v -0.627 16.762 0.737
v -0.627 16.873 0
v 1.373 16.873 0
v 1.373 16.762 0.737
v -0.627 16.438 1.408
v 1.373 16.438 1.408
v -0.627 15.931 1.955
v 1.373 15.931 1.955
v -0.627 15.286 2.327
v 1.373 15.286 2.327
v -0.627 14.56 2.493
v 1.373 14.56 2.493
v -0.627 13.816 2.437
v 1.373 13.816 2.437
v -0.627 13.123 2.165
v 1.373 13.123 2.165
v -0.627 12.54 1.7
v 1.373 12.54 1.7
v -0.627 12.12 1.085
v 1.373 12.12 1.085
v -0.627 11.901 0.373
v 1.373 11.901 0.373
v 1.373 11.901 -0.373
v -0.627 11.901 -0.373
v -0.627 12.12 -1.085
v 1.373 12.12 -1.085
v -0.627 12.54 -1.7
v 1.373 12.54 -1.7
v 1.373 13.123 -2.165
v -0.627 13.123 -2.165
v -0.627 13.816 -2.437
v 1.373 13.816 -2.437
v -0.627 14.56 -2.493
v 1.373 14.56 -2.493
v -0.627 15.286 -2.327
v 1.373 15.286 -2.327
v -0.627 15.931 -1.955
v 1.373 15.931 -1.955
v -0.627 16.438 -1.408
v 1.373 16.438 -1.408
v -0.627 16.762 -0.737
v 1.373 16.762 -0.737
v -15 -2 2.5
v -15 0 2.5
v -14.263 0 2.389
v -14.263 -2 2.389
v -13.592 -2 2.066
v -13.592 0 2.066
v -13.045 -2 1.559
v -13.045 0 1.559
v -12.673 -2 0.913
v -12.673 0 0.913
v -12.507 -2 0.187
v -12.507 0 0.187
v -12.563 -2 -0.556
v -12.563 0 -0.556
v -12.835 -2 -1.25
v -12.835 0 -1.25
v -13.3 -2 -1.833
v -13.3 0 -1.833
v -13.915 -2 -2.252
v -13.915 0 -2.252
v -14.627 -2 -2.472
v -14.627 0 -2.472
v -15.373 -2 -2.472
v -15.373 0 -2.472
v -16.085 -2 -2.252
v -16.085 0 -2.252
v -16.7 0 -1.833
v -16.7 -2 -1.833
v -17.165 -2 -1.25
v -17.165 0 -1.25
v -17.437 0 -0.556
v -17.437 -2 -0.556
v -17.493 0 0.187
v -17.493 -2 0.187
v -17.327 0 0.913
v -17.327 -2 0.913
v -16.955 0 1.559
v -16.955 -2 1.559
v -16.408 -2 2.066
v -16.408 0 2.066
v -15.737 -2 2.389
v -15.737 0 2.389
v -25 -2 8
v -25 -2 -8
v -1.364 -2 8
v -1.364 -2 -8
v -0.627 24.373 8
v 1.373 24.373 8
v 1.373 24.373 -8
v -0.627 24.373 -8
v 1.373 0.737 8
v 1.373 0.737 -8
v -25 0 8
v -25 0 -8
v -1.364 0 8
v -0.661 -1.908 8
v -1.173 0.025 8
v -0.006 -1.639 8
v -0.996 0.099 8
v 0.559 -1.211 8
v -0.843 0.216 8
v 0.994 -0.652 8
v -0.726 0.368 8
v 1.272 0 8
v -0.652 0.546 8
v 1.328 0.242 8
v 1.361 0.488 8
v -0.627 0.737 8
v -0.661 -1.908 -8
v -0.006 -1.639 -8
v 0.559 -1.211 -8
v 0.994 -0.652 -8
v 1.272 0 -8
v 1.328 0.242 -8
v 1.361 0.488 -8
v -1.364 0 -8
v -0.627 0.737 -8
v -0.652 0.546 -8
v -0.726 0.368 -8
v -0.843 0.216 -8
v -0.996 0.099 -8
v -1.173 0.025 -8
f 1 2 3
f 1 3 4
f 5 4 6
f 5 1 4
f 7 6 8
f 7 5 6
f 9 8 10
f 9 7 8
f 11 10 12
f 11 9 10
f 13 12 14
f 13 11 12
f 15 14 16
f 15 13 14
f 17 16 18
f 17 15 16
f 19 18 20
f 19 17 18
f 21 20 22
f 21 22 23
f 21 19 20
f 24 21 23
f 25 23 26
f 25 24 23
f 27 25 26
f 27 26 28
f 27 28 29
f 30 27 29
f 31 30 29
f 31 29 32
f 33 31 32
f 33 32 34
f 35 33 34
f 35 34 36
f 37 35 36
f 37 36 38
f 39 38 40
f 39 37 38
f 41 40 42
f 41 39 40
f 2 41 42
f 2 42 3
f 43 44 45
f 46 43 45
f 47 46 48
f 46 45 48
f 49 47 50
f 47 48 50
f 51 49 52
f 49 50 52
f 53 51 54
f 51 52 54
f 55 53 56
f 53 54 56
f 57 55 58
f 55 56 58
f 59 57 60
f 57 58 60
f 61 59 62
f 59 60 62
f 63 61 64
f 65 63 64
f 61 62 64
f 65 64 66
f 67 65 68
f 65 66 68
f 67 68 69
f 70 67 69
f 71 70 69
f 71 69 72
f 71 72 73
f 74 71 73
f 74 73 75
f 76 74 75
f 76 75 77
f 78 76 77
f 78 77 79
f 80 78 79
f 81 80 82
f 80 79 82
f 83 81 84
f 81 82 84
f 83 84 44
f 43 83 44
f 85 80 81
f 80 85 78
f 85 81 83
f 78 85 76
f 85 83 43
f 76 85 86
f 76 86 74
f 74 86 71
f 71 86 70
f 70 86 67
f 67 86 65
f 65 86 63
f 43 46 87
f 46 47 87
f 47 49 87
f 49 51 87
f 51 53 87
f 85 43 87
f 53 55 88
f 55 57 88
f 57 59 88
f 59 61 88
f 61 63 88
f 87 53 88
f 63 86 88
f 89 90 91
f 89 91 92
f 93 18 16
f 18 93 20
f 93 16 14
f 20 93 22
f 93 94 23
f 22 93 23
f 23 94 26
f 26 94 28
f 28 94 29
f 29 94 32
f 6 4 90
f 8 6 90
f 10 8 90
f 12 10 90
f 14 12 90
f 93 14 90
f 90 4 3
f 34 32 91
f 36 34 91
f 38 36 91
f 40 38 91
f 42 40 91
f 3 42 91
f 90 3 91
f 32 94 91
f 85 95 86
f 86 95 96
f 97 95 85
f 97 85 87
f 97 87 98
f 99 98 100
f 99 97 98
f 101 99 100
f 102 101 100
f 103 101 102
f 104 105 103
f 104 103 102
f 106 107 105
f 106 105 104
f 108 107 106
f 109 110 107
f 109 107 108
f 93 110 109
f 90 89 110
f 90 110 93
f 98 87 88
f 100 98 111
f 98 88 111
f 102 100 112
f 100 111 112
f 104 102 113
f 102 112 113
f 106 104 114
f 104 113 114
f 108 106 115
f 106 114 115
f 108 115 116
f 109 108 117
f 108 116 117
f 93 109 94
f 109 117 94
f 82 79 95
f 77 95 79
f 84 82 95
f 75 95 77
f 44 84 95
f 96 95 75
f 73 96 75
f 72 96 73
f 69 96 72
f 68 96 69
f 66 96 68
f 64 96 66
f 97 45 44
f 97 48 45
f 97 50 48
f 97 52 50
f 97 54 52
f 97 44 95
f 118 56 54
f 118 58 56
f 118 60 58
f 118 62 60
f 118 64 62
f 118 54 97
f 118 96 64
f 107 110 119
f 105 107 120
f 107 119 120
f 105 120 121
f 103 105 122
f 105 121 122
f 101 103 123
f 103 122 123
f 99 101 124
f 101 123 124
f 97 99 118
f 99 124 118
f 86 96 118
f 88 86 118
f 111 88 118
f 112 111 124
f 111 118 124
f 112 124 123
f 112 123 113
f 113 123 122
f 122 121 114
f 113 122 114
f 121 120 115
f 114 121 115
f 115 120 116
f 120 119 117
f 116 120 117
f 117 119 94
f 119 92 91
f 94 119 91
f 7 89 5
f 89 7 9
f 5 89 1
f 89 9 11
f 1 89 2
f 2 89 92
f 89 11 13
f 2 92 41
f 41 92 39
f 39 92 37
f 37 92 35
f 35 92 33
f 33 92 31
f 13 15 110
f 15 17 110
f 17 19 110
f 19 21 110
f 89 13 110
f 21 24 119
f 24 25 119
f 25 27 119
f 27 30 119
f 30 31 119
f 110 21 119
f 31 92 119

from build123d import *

# Parameters (mm, degrees)
CROQUIS2_W                      = 50
CROQUIS2_H                      = 16
CROQUIS2_R                      = 2.5
BRIDA_BASE1_DEPTH               = 2
PLIEGUE_START                   = -8
PLIEGUE_CROQUIZADO1_DEPTH       = 16
PLIEGUE_CROQUIZADO1_2_DEPTH     = 5.4999999
PLIEGUE_START_2                 = 2.5000001
PLIEGUE_CROQUIZADO1_3_DEPTH     = 5.4999999
PLIEGUE_START_3                 = -2.5000001
PLIEGUE_CROQUIZADO1_4_DEPTH     = 5.0000002
PLIEGUE_START_4                 = -0.627322451
PLIEGUE_CROQUIZADO1_5_OUTLINE_R = 2.5
PLIEGUE_CROQUIZADO1_5_DEPTH     = 2


with BuildPart() as part:
    # Brida base1: sheet metal written as solids
    # Croquis2 → Brida base1 (new body)
    with BuildSketch(Plane(origin=(0, 0, 0), x_dir=(1, 0, 0), z_dir=(0, 1, 0))):
        Rectangle(CROQUIS2_W, CROQUIS2_H)
        with Locations(Location((15, 0, 0), (0, 0, 270))):
            Circle(CROQUIS2_R, mode=Mode.SUBTRACT)
        with Locations(Location((-15, 0, 0), (0, 0, 270))):
            Circle(CROQUIS2_R, mode=Mode.SUBTRACT)
    extrude(amount=-BRIDA_BASE1_DEPTH)

    # Pliegue croquizado1: read off the stored shape, not the designer's step
    # Pliegue croquizado1 outline → Pliegue croquizado1 (cut)
    with BuildSketch(Plane.XY.offset(PLIEGUE_START)):
        with BuildLine():
            Line((25, 0), (1.271679947, 0))
            ThreePointArc((1.271679947, 0), (0.290344758, -1.443395312), (-1.363922451, -2))
            Line((-1.363922451, -2), (25, -2))
            Line((25, -2), (25, 0))
        make_face()
    extrude(amount=PLIEGUE_CROQUIZADO1_DEPTH, mode=Mode.SUBTRACT)

    # Pliegue croquizado1 2 outline → Pliegue croquizado1 2 (add)
    with BuildSketch(Plane.XY.offset(PLIEGUE_START)):
        with BuildLine():
            Line((-0.627322451, 24.372677549), (-0.627322451, 0.7366))
            ThreePointArc((-0.627322451, 0.7366), (-0.843067596, 0.215745145), (-1.363922451, 0))
            Line((-1.363922451, 0), (1.271679947, 0))
            ThreePointArc((1.271679947, 0), (1.347310579, 0.364854094), (1.372677549, 0.7366))
            Line((1.372677549, 0.7366), (1.372677549, 24.372677549))
            Line((1.372677549, 24.372677549), (-0.627322451, 24.372677549))
        make_face()
    extrude(amount=PLIEGUE_CROQUIZADO1_2_DEPTH)

    # Pliegue croquizado1 3 outline → Pliegue croquizado1 3 (add)
    with BuildSketch(Plane.XY.offset(PLIEGUE_START_2)):
        with BuildLine():
            Line((-0.627322451, 24.372677549), (-0.627322451, 0.7366))
            ThreePointArc((-0.627322451, 0.7366), (-0.843067596, 0.215745145), (-1.363922451, 0))
            Line((-1.363922451, 0), (1.271679947, 0))
            ThreePointArc((1.271679947, 0), (1.347310579, 0.364854094), (1.372677549, 0.7366))
            Line((1.372677549, 0.7366), (1.372677549, 24.372677549))
            Line((1.372677549, 24.372677549), (-0.627322451, 24.372677549))
        make_face()
    extrude(amount=PLIEGUE_CROQUIZADO1_3_DEPTH)

    # Pliegue croquizado1 4 outline → Pliegue croquizado1 4 (add)
    with BuildSketch(Plane.XY.offset(PLIEGUE_START_3)):
        with BuildLine():
            Line((-0.627322451, 24.372677549), (-0.627322451, 0.7366))
            ThreePointArc((-0.627322451, 0.7366), (-0.843067596, 0.215745145), (-1.363922451, 0))
            Line((-1.363922451, 0), (1.271679947, 0))
            ThreePointArc((1.271679947, 0), (1.347310579, 0.364854094), (1.372677549, 0.7366))
            Line((1.372677549, 0.7366), (1.372677549, 24.372677549))
            Line((1.372677549, 24.372677549), (-0.627322451, 24.372677549))
        make_face()
    extrude(amount=PLIEGUE_CROQUIZADO1_4_DEPTH)

    # Pliegue croquizado1 5 outline → Pliegue croquizado1 5 (cut)
    with BuildSketch(Plane.YZ.offset(PLIEGUE_START_4)):
        with Locations((14.372677549, 0)):
            Circle(PLIEGUE_CROQUIZADO1_5_OUTLINE_R)
    extrude(amount=PLIEGUE_CROQUIZADO1_5_DEPTH, mode=Mode.SUBTRACT)


solid = part.part
